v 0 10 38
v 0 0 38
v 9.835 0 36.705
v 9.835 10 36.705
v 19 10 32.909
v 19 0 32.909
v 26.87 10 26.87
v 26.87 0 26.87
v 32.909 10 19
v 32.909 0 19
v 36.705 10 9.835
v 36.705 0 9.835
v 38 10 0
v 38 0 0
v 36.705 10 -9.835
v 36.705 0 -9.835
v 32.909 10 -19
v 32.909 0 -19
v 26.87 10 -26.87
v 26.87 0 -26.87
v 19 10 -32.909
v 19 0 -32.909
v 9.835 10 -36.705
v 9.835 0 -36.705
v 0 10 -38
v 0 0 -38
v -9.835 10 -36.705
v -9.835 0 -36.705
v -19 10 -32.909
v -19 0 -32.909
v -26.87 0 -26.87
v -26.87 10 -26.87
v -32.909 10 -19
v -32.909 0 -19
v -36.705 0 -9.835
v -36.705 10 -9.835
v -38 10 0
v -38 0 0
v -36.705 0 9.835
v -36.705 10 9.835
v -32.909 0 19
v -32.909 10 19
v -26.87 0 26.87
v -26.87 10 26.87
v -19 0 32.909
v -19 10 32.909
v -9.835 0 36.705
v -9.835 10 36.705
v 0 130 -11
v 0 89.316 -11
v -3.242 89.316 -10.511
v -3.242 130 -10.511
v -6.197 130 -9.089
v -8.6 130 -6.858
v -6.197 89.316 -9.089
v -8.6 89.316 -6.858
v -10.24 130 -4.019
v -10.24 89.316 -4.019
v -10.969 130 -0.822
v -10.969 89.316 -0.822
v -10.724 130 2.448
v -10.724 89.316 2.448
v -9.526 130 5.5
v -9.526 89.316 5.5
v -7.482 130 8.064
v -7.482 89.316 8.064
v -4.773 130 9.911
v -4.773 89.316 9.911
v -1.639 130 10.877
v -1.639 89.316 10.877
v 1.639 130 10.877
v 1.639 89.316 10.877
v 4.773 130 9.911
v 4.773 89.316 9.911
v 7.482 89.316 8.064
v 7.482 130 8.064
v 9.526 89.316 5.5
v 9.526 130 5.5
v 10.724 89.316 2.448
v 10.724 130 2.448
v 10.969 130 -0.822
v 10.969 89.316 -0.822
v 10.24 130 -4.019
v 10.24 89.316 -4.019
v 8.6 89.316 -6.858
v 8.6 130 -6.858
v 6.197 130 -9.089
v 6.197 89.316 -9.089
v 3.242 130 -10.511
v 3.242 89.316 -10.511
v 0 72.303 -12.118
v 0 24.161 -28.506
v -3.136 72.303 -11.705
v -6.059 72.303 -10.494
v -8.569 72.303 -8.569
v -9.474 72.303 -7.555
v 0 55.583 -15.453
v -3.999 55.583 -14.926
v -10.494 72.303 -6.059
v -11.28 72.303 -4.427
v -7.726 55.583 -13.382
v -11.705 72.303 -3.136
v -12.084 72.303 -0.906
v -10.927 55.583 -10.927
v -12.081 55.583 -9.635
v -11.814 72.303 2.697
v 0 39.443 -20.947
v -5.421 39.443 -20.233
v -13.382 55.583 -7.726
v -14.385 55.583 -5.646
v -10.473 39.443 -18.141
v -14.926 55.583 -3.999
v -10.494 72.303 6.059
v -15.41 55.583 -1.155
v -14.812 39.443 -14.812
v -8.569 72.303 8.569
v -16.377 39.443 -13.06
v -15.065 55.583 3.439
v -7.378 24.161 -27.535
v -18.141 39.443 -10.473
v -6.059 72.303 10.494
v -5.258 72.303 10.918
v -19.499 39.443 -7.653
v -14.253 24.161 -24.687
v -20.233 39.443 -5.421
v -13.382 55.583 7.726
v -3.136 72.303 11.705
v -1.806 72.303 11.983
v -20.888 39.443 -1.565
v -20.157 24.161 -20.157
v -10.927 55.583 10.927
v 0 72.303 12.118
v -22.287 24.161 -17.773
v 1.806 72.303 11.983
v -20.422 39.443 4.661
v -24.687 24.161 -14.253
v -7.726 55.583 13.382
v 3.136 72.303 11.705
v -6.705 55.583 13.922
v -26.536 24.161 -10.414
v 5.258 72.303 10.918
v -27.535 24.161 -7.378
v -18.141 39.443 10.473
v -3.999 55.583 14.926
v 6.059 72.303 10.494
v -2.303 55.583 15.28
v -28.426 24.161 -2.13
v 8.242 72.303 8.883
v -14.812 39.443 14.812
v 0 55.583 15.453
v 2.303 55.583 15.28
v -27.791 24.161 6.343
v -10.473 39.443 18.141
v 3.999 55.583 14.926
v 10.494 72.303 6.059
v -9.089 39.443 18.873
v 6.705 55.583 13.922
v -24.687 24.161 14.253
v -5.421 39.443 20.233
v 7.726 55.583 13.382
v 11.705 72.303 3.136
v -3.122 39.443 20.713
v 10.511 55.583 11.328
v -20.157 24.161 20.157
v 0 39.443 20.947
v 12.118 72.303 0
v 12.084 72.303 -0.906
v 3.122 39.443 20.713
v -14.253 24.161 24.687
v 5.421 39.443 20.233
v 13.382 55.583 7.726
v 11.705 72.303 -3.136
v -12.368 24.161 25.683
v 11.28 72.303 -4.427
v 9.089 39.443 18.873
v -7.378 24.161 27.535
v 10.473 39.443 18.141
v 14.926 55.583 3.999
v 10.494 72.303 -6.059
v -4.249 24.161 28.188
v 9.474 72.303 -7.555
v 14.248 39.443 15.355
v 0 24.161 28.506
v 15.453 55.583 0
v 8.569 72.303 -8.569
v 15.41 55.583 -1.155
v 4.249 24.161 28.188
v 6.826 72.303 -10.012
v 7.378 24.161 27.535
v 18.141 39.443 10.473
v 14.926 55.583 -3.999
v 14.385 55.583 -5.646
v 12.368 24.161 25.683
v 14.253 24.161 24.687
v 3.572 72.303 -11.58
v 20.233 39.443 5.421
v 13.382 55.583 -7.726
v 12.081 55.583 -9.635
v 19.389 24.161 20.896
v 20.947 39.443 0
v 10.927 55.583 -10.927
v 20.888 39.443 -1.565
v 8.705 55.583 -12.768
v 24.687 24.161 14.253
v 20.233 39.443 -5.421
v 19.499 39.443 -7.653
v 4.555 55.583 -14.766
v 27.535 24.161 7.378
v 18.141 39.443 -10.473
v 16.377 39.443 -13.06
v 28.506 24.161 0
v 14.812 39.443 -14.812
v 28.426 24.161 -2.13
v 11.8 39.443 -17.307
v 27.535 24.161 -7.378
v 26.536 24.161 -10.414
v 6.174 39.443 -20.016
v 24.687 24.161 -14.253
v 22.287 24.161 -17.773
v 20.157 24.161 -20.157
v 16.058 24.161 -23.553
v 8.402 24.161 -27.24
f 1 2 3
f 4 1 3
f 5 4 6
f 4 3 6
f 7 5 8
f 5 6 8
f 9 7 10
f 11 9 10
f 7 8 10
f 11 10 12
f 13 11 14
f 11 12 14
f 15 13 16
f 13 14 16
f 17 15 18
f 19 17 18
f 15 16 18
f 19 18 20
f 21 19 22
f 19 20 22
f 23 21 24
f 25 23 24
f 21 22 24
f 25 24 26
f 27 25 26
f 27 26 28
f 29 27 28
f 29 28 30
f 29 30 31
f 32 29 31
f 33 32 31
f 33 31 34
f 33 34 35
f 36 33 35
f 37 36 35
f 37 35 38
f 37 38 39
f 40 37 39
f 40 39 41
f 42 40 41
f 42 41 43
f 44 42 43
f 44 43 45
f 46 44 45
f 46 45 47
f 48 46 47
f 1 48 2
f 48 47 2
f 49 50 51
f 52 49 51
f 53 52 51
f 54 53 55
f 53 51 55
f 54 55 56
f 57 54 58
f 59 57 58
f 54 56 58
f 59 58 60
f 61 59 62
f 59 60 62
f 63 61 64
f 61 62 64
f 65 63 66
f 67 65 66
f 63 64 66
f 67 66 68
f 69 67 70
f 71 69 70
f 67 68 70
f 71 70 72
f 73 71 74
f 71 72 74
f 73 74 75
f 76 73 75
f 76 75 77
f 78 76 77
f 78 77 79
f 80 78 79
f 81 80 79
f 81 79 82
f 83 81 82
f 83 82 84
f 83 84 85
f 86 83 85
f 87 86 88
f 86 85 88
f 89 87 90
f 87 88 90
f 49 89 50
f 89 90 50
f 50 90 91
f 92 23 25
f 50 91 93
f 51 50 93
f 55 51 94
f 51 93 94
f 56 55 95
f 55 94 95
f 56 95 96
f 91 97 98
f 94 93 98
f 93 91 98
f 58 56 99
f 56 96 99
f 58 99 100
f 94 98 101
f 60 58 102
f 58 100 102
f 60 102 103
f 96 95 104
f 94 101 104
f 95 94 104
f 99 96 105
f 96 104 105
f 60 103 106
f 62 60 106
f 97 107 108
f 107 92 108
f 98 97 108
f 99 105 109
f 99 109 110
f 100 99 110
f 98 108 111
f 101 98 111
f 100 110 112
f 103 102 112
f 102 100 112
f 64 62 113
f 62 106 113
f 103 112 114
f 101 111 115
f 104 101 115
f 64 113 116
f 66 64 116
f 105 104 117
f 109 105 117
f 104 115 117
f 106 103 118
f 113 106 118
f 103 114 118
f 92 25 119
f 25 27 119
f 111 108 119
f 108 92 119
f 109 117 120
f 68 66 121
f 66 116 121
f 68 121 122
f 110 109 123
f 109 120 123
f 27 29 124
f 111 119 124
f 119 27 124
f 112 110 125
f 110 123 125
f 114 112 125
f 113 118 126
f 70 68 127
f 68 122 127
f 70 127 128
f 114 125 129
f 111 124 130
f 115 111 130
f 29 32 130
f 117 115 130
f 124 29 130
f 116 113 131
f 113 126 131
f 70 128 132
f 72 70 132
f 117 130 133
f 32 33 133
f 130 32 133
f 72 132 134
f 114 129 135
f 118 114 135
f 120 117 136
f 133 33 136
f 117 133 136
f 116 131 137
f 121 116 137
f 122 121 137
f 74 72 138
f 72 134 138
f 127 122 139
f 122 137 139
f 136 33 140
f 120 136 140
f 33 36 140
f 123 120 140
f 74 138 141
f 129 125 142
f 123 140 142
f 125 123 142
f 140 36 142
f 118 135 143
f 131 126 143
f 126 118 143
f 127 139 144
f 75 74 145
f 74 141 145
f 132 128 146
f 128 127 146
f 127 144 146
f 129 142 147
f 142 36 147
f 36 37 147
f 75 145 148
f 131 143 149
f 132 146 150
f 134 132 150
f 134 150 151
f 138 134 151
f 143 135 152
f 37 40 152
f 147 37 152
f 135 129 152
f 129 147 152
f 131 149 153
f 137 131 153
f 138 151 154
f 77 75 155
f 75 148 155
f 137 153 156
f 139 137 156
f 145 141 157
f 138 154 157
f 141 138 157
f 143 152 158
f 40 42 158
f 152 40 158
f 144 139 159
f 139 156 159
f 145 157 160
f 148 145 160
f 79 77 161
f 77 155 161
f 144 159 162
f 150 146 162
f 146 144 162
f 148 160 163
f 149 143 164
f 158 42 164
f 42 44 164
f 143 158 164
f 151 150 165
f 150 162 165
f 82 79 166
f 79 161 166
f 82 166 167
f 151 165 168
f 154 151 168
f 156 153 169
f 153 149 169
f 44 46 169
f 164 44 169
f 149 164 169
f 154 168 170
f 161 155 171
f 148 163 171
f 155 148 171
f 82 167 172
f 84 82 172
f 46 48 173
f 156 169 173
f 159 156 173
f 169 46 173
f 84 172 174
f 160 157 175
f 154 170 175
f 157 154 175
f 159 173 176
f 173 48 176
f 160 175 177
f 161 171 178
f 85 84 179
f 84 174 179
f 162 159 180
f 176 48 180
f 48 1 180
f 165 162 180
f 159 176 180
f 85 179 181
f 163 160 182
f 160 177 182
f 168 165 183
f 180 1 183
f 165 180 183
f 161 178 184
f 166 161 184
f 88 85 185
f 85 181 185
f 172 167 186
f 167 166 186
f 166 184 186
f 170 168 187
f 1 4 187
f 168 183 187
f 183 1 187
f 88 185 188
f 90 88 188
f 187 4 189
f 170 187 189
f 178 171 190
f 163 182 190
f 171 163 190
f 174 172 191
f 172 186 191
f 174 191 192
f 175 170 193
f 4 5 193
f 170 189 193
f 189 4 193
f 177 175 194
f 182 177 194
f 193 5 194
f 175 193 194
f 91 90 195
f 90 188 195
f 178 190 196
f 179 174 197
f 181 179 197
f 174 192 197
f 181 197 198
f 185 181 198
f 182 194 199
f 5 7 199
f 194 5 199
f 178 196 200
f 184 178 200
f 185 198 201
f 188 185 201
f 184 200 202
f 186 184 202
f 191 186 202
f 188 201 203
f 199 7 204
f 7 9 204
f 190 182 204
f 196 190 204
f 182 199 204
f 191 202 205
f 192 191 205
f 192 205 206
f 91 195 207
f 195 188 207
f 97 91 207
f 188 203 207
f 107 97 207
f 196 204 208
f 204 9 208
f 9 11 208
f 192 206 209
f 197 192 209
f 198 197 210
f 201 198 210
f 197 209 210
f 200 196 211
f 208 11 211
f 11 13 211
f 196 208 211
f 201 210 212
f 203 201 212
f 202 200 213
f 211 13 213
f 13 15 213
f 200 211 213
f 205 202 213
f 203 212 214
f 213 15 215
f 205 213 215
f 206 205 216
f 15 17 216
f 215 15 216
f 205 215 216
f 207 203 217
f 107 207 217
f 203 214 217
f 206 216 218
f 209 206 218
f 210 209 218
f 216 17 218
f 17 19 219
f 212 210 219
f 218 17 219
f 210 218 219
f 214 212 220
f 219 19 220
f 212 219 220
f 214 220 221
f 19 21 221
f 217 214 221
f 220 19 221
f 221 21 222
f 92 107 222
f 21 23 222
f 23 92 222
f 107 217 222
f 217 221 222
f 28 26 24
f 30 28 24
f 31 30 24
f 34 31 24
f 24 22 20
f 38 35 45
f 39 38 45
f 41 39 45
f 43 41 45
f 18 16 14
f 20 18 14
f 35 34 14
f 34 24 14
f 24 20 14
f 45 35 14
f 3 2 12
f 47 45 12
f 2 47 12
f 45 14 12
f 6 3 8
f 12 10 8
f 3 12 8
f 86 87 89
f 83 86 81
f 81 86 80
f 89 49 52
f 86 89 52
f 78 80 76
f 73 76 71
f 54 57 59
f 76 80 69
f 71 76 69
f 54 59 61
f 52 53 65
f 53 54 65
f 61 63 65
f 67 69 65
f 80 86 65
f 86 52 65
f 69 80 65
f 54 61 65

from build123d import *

# Parameters (mm, degrees)
SKETCH_1_R      = 38
EXTRUDE_1_DEPTH = 10
FILLET_1_R      = 130


with BuildPart() as part:
    # 草图1 → 凸台-拉伸1 (new body)
    with BuildSketch(Plane(origin=(0, 0, 0), x_dir=(1, 0, 0), z_dir=(0, 1, 0))):
        with Locations(Location((0, 0, 0), (0, 0, 270))):
            Circle(SKETCH_1_R)
    extrude(amount=EXTRUDE_1_DEPTH)

    # 草图3 → 旋转1 (revolve)
    with BuildSketch(Plane.XY, mode=Mode.PRIVATE) as revolve_1_sk:
        Polygon((0, 130), (11, 130), (11, 40), (38, 10), (0, 10), align=None)
    revolve(revolve_1_sk.sketch.rotate(Axis((0, 0, 0), (0, 1, 0)), 90), axis=Axis((0, 0, 0), (0, 1, 0)))

    # 圆角1
    # the kernel refuses this fillet: 130 mm, written as the material it adds along each edge
    with BuildSketch(Plane(origin=(0, 40, 0), x_dir=(0, 0, -1), z_dir=(1, 0, 0))) as fillet_1_piece_1:
        with BuildLine():
            CenterArc((141, 49.315824398), FILLET_1_R, 180, 37.598305078)
            Line((11, 49.315824398), (8.4, 49.315824398))
            Line((8.4, 49.315824398), (8.4, 0))
            Line((8.4, 0), (9.06743522, -1.739308302))
            ThreePointArc((9.06743522, -1.739308302), (22.56743522, -16.739308302), (35.94, -31.586316488))
            Line((35.94, -31.586316488), (38, -30))
        make_face()
    revolve(axis=Axis((0, 40, 0), (0, 1, 0)))


solid = part.part
